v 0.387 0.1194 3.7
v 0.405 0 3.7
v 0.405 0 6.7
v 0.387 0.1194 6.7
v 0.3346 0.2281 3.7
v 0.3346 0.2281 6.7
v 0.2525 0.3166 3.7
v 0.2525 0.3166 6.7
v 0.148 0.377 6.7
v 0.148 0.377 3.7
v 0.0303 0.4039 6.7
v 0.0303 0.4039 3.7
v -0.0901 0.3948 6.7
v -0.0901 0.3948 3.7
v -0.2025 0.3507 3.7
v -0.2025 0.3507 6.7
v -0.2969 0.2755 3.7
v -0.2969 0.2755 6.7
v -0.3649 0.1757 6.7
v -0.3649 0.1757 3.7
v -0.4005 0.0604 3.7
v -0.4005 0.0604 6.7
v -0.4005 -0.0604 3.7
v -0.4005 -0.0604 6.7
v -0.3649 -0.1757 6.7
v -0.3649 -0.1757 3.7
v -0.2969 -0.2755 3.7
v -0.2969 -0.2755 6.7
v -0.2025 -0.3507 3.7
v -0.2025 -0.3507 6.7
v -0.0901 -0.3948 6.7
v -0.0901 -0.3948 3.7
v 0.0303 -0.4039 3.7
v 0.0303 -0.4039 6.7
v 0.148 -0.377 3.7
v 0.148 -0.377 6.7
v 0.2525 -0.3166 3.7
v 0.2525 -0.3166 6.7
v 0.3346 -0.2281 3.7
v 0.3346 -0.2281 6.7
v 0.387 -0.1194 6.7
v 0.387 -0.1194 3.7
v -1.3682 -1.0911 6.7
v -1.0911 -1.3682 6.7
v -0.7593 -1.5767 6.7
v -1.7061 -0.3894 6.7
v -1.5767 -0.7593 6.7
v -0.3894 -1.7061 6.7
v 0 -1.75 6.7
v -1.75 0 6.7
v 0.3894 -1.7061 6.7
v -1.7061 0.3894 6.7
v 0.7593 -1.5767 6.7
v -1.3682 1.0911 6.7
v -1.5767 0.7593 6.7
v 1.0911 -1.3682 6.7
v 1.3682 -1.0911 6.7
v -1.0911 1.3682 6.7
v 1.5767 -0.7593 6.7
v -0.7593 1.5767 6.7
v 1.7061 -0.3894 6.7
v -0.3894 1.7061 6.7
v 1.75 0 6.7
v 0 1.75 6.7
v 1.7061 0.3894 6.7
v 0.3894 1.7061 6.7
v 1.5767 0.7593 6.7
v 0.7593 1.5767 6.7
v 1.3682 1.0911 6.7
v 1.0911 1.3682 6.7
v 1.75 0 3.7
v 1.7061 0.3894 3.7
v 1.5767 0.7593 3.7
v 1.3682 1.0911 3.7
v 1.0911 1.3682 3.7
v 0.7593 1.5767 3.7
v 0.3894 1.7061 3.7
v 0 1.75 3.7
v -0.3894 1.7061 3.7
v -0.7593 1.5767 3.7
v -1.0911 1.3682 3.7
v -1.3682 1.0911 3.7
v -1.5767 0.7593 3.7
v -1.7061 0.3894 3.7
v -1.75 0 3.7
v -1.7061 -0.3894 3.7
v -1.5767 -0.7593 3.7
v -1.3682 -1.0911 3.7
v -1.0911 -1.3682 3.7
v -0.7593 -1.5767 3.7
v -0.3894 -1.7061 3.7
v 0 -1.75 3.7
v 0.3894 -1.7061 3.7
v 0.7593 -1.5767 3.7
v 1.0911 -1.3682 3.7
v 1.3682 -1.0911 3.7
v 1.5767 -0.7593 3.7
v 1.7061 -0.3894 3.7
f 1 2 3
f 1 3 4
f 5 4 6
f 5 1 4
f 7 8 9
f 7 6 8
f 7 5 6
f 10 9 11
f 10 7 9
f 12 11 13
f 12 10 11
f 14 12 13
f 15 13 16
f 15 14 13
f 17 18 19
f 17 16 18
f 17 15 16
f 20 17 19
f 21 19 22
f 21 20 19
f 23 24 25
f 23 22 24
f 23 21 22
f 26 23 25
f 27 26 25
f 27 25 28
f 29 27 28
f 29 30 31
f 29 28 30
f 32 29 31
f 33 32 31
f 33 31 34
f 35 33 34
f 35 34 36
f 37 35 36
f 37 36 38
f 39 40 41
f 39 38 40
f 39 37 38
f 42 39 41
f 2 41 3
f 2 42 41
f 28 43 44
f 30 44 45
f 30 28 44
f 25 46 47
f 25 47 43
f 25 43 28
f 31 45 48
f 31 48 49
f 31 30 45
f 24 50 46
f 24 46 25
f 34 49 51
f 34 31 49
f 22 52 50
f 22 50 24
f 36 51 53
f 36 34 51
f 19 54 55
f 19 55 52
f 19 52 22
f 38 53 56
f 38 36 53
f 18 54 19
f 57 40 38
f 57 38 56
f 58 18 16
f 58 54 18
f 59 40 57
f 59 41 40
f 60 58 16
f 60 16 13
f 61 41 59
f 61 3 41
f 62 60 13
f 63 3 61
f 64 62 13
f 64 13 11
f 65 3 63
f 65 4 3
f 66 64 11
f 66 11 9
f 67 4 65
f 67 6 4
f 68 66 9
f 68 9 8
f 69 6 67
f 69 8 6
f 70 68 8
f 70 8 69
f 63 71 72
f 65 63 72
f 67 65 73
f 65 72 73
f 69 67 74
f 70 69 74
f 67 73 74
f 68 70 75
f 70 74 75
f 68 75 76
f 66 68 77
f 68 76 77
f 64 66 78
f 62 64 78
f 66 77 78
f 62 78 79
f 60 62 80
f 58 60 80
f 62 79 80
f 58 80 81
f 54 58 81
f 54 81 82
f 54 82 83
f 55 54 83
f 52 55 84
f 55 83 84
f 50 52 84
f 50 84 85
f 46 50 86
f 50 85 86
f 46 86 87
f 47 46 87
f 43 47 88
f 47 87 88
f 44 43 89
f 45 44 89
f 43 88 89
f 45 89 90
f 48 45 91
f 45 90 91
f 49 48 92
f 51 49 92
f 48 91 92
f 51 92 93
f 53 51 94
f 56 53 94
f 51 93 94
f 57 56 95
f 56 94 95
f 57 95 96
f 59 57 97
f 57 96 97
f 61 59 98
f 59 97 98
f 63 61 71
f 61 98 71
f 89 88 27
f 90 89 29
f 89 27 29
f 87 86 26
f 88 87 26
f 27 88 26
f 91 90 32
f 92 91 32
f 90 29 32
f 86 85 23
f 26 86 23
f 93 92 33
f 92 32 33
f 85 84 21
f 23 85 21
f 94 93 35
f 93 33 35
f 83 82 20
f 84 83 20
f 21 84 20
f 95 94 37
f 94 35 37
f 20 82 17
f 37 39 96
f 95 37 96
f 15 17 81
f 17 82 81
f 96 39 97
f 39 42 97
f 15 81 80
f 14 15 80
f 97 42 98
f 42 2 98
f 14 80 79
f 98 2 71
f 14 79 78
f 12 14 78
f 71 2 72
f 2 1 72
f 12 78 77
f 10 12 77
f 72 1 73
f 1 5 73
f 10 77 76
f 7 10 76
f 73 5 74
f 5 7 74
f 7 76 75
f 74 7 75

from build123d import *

# Parameters (mm, degrees)
CYLINDER159_R     = 0.405
CYLINDER159_DEPTH = 17
CYLINDER149_R     = 1.75
CYLINDER149_DEPTH = 3


with BuildPart() as ftbeadhole:
    # Cylinder159 → Cylinder159 (new body)
    with BuildSketch(Plane.XY):
        Circle(CYLINDER159_R)
    extrude(amount=CYLINDER159_DEPTH)


with BuildPart() as cut020:
    # Cylinder149 → Cylinder149 (new body)
    with BuildSketch(Plane.XY.offset(2.7)):
        Circle(CYLINDER149_R)
    extrude(amount=CYLINDER149_DEPTH)

    # Cut020: cut FTBeadHole
    add(ftbeadhole.part, mode=Mode.SUBTRACT)


with BuildPart() as cut020_1:
    # Cut020 placement: moved
    add(cut020.part.moved(Location((0, 0, 1))))


solid = cut020_1.part
